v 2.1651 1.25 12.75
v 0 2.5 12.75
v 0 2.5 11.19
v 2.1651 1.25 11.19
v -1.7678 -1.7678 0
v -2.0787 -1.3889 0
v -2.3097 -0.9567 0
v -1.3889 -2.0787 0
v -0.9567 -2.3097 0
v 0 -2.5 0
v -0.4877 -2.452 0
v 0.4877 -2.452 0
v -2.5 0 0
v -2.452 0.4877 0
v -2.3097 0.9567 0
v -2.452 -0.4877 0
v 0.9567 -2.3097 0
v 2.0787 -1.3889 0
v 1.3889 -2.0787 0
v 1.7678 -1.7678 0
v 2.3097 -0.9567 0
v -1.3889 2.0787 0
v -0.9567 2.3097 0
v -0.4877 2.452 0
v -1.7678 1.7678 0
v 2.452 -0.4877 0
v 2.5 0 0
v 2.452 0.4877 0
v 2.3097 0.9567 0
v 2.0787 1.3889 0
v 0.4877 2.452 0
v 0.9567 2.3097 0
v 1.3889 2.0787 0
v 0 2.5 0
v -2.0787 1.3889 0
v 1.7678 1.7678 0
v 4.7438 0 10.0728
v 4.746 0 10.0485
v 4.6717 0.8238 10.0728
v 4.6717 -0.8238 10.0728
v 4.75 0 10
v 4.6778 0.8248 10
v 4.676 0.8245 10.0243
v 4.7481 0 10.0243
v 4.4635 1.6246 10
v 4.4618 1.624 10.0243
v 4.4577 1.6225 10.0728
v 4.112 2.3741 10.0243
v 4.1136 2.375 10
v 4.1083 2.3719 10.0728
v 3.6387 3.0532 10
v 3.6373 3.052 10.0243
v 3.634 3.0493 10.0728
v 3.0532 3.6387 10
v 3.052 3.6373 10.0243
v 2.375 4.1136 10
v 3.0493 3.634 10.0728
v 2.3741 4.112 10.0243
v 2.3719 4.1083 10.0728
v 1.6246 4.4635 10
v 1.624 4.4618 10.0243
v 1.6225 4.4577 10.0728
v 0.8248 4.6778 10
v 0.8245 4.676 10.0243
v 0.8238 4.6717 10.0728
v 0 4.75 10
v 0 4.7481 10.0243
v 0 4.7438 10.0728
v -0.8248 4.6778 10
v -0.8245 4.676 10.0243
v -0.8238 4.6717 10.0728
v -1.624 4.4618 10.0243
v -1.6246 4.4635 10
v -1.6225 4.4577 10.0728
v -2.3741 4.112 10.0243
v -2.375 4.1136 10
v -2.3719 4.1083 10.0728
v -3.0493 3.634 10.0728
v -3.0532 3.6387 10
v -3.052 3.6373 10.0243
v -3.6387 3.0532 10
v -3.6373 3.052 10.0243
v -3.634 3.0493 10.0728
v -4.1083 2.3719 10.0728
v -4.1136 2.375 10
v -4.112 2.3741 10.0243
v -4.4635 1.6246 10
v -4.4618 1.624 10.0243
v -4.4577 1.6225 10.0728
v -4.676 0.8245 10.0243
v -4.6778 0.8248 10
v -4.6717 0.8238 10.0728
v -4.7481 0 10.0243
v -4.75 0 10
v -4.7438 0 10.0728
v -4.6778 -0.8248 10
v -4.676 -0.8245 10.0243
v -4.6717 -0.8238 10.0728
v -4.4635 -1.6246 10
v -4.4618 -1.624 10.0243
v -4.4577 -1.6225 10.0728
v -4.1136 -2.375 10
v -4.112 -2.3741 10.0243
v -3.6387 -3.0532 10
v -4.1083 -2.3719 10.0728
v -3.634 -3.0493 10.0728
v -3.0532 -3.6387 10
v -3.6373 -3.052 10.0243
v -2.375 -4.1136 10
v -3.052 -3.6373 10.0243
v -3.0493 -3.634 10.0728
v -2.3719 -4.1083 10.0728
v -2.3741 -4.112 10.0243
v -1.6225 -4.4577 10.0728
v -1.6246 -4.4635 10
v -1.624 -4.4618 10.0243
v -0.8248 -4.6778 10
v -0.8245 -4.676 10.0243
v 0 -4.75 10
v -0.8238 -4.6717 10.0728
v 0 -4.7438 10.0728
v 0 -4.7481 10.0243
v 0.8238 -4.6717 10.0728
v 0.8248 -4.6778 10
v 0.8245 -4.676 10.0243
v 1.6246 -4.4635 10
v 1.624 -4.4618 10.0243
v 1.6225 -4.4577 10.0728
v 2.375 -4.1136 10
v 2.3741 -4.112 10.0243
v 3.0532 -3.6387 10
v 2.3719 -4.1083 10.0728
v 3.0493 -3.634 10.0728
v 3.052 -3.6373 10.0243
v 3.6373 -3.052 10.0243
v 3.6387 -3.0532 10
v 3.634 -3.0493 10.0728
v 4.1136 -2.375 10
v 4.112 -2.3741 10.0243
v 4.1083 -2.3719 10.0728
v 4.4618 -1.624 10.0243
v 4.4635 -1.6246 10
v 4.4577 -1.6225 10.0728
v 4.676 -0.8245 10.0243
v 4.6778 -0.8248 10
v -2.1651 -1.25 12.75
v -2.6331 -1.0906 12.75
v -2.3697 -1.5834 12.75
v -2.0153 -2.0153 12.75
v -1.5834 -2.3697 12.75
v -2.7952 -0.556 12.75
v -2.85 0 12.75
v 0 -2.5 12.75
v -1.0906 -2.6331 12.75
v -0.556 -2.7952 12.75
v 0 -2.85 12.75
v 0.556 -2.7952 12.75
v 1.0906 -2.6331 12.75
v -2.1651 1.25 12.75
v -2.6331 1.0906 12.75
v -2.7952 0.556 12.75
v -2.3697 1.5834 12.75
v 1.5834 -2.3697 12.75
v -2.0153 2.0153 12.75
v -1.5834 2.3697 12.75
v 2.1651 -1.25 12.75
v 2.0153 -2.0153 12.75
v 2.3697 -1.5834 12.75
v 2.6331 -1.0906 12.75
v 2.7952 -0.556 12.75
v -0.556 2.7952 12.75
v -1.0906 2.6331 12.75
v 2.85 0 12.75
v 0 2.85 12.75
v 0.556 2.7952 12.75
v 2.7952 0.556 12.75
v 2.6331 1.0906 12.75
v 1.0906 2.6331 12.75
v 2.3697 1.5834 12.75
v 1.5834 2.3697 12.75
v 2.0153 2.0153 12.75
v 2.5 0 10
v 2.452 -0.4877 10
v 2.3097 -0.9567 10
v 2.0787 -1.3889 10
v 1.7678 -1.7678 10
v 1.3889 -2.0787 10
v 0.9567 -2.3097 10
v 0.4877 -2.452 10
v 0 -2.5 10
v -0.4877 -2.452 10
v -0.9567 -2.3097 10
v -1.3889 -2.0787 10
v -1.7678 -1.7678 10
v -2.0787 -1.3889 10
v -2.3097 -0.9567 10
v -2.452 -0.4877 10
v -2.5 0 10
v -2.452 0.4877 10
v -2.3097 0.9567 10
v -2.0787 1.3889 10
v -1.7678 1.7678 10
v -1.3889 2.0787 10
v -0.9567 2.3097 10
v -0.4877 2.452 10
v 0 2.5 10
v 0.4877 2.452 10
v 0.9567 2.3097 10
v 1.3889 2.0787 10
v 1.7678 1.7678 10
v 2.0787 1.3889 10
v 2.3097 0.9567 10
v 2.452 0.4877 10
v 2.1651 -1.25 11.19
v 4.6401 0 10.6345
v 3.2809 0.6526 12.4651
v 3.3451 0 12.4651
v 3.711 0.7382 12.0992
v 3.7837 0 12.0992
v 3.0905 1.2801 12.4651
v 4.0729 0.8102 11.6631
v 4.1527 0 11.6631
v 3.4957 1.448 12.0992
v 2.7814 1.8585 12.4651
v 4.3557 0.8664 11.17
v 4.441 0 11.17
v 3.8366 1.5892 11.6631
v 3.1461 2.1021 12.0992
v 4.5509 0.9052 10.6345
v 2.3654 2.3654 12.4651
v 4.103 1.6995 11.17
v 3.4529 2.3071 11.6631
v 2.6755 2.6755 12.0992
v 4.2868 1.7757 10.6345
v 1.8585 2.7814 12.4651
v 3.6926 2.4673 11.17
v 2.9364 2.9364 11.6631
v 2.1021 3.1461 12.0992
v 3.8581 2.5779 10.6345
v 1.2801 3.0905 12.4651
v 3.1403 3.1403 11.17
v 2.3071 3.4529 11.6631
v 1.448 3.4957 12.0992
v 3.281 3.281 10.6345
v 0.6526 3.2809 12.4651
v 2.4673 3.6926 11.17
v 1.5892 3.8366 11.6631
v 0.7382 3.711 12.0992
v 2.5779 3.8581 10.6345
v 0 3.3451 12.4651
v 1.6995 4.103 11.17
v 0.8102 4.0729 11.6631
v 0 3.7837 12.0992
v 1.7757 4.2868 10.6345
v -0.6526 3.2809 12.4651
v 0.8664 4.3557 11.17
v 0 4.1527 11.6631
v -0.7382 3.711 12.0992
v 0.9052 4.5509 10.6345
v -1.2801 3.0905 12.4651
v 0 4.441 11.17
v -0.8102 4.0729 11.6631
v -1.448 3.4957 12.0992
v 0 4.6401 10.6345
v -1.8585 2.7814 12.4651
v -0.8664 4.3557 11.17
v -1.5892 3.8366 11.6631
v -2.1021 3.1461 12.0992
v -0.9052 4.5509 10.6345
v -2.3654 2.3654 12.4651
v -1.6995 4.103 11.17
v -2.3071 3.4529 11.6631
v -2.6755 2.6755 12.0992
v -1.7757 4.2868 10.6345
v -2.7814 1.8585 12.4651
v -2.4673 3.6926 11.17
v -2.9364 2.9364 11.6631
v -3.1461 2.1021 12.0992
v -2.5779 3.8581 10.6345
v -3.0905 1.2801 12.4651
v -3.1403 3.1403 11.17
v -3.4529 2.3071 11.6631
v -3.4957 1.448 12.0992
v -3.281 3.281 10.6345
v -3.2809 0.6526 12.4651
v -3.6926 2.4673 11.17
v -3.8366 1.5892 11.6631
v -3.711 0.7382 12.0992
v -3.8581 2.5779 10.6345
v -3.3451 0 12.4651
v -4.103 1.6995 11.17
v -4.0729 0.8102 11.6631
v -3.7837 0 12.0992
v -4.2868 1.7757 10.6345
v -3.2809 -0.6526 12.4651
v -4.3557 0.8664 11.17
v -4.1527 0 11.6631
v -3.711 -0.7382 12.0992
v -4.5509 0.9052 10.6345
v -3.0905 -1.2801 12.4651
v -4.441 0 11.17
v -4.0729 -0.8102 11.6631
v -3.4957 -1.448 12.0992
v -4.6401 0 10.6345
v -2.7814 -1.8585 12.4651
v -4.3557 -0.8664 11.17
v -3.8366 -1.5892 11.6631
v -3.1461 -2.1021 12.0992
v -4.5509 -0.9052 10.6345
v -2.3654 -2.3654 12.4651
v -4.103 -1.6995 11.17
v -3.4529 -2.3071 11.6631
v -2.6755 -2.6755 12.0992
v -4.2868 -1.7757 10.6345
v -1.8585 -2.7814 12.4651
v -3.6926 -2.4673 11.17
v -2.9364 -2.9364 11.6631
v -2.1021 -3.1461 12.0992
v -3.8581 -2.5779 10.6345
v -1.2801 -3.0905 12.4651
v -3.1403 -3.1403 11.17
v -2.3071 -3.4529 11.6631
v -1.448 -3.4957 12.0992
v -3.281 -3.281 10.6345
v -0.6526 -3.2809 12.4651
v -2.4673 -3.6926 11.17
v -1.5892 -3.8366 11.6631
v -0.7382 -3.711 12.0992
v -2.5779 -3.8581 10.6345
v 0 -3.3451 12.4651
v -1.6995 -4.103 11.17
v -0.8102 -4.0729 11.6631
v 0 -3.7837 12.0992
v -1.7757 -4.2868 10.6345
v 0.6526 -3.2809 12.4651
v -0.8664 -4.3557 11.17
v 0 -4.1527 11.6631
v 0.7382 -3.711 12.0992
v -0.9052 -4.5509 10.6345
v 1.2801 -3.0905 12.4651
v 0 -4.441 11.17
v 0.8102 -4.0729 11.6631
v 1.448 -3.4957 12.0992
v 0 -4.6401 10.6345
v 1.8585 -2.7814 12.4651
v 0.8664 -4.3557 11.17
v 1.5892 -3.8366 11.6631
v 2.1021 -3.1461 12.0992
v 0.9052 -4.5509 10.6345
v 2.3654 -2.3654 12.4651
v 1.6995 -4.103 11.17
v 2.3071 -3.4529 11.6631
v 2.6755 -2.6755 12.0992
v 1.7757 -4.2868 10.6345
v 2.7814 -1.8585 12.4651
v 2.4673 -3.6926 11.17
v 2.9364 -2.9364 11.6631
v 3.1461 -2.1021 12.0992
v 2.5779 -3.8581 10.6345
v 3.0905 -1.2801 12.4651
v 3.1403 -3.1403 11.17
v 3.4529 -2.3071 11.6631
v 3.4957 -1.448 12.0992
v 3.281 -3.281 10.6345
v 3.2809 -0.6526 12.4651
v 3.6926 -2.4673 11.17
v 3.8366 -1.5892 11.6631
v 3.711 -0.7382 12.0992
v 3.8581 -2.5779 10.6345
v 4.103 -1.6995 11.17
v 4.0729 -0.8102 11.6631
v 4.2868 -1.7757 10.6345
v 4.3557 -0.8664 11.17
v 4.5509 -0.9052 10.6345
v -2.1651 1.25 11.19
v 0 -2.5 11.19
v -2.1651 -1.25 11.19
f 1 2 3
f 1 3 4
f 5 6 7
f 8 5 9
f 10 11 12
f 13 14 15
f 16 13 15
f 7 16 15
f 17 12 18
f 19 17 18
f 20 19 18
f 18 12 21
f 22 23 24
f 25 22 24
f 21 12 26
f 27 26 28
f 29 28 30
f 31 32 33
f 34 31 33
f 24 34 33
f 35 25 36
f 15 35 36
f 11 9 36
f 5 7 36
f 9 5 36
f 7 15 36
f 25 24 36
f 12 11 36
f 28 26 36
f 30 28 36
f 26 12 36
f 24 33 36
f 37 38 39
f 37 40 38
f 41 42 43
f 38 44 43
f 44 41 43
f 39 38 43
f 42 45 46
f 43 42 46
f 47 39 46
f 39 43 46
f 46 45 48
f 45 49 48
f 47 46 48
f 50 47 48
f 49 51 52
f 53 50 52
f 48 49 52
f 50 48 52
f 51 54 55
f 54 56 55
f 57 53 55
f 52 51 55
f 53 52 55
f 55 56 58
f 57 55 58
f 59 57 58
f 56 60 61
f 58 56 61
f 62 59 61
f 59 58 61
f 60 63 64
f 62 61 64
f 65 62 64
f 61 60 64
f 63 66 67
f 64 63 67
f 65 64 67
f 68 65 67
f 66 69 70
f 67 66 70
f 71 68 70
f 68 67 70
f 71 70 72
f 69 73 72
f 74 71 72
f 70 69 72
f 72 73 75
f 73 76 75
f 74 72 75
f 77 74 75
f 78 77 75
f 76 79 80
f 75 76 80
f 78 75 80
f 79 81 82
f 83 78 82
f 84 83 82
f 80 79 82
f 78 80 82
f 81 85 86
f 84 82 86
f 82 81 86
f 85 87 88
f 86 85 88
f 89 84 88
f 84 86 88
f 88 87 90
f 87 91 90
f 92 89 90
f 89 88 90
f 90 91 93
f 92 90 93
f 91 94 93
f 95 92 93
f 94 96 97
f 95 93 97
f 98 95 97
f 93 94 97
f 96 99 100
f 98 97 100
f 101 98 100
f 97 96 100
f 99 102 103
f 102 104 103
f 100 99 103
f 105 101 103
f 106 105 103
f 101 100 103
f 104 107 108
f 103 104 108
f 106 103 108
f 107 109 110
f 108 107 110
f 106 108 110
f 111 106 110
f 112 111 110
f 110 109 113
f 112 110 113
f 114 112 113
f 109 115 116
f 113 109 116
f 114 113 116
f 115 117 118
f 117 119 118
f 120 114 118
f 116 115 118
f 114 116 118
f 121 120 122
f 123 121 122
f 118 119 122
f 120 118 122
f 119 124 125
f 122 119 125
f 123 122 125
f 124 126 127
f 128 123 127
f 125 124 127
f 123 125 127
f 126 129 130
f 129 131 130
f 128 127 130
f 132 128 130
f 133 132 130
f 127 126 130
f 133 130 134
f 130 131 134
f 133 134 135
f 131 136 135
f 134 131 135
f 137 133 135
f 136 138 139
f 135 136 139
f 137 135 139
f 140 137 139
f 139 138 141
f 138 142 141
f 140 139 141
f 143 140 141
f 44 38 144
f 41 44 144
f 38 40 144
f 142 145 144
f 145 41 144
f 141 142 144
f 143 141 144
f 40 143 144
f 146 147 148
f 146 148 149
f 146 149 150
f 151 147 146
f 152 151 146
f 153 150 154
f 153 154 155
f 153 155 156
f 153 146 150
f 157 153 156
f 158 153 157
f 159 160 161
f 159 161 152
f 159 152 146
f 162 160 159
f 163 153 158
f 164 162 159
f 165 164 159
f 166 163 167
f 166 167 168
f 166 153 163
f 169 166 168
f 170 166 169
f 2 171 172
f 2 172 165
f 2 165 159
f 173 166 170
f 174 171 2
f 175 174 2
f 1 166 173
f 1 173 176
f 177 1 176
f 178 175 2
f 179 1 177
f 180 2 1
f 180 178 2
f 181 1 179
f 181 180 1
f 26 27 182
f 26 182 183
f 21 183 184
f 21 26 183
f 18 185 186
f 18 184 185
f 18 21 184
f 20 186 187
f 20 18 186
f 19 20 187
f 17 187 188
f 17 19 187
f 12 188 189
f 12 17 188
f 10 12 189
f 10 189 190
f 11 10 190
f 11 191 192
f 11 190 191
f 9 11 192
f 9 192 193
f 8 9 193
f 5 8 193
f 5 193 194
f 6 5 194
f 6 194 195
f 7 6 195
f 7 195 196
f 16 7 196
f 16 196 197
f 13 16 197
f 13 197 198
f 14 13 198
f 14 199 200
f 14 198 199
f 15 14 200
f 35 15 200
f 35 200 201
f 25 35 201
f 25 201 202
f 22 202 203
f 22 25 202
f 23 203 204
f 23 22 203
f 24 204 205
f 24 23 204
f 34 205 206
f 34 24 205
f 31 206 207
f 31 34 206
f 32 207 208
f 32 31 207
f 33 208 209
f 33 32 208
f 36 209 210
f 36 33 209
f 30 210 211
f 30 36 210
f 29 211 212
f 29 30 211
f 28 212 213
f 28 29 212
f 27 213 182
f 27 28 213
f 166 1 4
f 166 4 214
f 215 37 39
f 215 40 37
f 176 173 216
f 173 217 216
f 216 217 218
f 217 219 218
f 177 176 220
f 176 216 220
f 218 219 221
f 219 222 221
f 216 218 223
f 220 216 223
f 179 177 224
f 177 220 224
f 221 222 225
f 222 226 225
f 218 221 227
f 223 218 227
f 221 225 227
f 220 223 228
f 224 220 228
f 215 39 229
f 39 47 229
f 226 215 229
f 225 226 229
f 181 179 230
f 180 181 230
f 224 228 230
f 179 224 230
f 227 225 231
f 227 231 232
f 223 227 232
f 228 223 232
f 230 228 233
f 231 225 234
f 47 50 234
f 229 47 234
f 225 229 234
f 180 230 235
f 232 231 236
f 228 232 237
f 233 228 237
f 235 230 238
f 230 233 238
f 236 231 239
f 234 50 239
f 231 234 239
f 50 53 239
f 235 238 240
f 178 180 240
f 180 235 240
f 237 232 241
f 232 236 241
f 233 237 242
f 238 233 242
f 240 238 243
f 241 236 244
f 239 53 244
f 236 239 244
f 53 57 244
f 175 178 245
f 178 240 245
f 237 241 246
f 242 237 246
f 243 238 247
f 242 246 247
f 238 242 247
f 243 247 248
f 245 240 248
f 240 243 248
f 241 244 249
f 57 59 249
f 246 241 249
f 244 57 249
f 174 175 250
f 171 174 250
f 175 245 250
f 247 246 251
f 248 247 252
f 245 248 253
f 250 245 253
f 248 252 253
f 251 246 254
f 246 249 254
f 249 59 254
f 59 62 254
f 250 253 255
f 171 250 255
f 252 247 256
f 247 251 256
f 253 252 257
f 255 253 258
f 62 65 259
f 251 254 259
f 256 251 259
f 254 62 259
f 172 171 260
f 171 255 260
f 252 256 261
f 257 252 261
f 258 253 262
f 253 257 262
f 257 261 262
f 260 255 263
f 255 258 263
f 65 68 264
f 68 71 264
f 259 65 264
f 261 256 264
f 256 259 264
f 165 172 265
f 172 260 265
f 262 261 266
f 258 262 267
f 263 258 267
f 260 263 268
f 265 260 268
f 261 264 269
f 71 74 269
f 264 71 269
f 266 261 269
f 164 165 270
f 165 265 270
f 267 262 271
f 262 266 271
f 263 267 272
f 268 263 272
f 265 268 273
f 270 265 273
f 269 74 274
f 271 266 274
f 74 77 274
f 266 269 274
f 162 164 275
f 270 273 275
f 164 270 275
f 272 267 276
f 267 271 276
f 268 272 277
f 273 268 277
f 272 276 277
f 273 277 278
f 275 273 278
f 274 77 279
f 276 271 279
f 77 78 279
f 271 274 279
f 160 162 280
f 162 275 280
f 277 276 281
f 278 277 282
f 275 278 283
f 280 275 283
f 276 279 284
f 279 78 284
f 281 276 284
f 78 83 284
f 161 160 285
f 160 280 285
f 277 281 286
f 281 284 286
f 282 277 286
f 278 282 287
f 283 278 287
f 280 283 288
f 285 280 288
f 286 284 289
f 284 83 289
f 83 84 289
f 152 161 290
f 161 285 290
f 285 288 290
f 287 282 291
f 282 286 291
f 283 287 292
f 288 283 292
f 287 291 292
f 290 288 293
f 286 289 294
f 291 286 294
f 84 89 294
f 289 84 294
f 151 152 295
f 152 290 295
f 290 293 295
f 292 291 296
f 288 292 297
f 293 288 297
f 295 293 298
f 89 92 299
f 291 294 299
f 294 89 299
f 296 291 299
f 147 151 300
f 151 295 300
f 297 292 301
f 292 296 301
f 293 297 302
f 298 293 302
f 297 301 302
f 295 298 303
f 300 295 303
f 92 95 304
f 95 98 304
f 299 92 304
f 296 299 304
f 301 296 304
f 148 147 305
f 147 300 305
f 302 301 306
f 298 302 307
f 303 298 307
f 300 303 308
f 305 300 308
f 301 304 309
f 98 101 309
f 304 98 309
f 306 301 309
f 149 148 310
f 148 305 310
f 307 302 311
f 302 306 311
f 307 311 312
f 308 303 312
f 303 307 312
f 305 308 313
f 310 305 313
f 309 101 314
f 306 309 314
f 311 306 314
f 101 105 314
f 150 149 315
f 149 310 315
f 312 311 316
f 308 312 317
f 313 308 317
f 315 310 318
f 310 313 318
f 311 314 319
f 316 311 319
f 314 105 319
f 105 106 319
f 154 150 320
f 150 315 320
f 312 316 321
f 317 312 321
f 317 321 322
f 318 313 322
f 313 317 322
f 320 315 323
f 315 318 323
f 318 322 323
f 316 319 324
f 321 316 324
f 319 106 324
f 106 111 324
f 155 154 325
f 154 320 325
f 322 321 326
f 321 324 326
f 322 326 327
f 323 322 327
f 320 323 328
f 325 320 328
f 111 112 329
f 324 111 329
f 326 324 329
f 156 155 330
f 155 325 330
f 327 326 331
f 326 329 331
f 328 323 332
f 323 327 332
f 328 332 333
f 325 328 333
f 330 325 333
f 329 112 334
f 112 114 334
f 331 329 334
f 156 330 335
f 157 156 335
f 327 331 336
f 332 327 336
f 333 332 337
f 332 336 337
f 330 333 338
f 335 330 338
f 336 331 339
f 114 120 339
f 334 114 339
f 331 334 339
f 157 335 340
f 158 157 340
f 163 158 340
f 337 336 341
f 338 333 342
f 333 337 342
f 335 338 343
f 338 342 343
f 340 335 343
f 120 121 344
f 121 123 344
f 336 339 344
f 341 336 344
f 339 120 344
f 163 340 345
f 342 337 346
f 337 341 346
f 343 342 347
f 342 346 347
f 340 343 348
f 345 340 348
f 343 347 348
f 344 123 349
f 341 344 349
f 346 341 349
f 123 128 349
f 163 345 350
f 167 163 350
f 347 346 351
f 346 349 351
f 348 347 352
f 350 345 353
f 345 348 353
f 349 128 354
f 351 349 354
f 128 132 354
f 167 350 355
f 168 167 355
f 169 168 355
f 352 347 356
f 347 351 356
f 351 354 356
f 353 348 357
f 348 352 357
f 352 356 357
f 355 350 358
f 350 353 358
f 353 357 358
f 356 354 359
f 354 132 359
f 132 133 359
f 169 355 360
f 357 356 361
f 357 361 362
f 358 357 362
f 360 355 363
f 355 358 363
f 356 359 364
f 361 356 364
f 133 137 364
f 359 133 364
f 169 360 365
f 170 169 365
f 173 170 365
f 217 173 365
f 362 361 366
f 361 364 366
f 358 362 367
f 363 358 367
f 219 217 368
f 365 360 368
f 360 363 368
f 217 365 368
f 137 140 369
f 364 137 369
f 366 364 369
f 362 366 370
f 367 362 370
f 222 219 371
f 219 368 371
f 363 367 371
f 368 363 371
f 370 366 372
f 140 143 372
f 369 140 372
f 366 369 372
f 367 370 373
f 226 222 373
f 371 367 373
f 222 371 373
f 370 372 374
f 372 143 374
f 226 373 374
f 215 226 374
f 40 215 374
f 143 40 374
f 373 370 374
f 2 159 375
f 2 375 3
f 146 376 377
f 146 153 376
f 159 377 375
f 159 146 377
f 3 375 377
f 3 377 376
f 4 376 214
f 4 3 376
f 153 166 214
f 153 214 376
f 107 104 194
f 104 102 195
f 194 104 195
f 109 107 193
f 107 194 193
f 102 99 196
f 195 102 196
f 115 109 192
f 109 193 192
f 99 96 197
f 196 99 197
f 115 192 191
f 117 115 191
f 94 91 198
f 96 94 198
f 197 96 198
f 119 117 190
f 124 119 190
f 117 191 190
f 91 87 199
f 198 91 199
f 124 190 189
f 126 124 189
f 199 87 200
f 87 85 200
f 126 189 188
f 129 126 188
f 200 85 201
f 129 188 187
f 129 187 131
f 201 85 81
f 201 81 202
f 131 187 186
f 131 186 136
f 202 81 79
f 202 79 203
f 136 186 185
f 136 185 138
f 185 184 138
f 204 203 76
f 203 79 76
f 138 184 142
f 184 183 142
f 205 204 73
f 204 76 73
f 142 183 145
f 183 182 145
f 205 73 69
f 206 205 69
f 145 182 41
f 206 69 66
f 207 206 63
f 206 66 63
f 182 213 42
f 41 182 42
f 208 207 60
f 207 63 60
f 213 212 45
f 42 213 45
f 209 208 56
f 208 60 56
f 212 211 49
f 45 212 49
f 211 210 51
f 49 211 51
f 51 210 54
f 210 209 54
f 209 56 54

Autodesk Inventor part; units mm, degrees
ref_plane "YZ Plane" through (0, 0, 0) normal (1, 0, 0) x (0, 1, 0)
ref_plane "XZ Plane" through (0, 0, 0) normal (0, 1, 0) x (-1, 0, 0)
ref_plane "XY Plane" through (0, 0, 0) normal (0, 0, 1) x (1, 0, 0)
sketch "Sketch1" plane through (0, 0, 0) normal (0, 0, 1) x (1, 0, 0)
  circle A0 centre (0, 0) radius 2.5
  dimension "d0" = 5
extrude "Extrusion1" add sketch "Sketch1" along normal blind 10
thread "Thread1" size "12-24 UNC" class "2A" standard "ANSI Unified Screw Threads" full length
sketch "Sketch2" plane through (0, 0, 0) normal (0, 1, 0) x (-1, 0, 0)
  line L0 (0, 10.0728) -> (-4.75, 10.0728)
  line L1 (2.5, 10) -> (-2.5, 10) projected
  line L2 (0, 10) -> (-4.75, 10)
  line L3 (0, 10) -> (0, 12.75)
  line L4 (0, 12.75) -> (-2.85, 12.75)
  arc A0 (-2.85, 12.75) -> (-4.75, 10) centre (-1.457, 9.7562) ccw
  point P0 (0, 0)
  dimension "d5" = 4.75
  dimension "d6" = 2.75
  dimension "d7" = 2.85
  dimension "d8" = 3.302
revolve "Revolution1" add sketch "Sketch2" angle 360 about axis through (0, 0, 10) along (0, 0, 1)
sketch "Sketch3" plane through (0, 0, 12.75) normal (0, 0, 1) x (1, 0, 0)
  circle A0 centre (0, 0) radius 2.5 projected
  line L0 (0, 2.5) -> (2.1651, 1.25)
  line L1 (2.1651, 1.25) -> (2.1651, -1.25)
  line L2 (2.1651, -1.25) -> (0, -2.5)
  line L3 (0, -2.5) -> (-2.1651, -1.25)
  line L4 (-2.1651, -1.25) -> (-2.1651, 1.25)
  line L5 (-2.1651, 1.25) -> (0, 2.5)
extrude "Extrusion2" cut sketch "Sketch3" against normal blind 1.56 contours L1 L2 L3 L4 L5 L0
properties part number "5mm Button Head Screw Botch"
